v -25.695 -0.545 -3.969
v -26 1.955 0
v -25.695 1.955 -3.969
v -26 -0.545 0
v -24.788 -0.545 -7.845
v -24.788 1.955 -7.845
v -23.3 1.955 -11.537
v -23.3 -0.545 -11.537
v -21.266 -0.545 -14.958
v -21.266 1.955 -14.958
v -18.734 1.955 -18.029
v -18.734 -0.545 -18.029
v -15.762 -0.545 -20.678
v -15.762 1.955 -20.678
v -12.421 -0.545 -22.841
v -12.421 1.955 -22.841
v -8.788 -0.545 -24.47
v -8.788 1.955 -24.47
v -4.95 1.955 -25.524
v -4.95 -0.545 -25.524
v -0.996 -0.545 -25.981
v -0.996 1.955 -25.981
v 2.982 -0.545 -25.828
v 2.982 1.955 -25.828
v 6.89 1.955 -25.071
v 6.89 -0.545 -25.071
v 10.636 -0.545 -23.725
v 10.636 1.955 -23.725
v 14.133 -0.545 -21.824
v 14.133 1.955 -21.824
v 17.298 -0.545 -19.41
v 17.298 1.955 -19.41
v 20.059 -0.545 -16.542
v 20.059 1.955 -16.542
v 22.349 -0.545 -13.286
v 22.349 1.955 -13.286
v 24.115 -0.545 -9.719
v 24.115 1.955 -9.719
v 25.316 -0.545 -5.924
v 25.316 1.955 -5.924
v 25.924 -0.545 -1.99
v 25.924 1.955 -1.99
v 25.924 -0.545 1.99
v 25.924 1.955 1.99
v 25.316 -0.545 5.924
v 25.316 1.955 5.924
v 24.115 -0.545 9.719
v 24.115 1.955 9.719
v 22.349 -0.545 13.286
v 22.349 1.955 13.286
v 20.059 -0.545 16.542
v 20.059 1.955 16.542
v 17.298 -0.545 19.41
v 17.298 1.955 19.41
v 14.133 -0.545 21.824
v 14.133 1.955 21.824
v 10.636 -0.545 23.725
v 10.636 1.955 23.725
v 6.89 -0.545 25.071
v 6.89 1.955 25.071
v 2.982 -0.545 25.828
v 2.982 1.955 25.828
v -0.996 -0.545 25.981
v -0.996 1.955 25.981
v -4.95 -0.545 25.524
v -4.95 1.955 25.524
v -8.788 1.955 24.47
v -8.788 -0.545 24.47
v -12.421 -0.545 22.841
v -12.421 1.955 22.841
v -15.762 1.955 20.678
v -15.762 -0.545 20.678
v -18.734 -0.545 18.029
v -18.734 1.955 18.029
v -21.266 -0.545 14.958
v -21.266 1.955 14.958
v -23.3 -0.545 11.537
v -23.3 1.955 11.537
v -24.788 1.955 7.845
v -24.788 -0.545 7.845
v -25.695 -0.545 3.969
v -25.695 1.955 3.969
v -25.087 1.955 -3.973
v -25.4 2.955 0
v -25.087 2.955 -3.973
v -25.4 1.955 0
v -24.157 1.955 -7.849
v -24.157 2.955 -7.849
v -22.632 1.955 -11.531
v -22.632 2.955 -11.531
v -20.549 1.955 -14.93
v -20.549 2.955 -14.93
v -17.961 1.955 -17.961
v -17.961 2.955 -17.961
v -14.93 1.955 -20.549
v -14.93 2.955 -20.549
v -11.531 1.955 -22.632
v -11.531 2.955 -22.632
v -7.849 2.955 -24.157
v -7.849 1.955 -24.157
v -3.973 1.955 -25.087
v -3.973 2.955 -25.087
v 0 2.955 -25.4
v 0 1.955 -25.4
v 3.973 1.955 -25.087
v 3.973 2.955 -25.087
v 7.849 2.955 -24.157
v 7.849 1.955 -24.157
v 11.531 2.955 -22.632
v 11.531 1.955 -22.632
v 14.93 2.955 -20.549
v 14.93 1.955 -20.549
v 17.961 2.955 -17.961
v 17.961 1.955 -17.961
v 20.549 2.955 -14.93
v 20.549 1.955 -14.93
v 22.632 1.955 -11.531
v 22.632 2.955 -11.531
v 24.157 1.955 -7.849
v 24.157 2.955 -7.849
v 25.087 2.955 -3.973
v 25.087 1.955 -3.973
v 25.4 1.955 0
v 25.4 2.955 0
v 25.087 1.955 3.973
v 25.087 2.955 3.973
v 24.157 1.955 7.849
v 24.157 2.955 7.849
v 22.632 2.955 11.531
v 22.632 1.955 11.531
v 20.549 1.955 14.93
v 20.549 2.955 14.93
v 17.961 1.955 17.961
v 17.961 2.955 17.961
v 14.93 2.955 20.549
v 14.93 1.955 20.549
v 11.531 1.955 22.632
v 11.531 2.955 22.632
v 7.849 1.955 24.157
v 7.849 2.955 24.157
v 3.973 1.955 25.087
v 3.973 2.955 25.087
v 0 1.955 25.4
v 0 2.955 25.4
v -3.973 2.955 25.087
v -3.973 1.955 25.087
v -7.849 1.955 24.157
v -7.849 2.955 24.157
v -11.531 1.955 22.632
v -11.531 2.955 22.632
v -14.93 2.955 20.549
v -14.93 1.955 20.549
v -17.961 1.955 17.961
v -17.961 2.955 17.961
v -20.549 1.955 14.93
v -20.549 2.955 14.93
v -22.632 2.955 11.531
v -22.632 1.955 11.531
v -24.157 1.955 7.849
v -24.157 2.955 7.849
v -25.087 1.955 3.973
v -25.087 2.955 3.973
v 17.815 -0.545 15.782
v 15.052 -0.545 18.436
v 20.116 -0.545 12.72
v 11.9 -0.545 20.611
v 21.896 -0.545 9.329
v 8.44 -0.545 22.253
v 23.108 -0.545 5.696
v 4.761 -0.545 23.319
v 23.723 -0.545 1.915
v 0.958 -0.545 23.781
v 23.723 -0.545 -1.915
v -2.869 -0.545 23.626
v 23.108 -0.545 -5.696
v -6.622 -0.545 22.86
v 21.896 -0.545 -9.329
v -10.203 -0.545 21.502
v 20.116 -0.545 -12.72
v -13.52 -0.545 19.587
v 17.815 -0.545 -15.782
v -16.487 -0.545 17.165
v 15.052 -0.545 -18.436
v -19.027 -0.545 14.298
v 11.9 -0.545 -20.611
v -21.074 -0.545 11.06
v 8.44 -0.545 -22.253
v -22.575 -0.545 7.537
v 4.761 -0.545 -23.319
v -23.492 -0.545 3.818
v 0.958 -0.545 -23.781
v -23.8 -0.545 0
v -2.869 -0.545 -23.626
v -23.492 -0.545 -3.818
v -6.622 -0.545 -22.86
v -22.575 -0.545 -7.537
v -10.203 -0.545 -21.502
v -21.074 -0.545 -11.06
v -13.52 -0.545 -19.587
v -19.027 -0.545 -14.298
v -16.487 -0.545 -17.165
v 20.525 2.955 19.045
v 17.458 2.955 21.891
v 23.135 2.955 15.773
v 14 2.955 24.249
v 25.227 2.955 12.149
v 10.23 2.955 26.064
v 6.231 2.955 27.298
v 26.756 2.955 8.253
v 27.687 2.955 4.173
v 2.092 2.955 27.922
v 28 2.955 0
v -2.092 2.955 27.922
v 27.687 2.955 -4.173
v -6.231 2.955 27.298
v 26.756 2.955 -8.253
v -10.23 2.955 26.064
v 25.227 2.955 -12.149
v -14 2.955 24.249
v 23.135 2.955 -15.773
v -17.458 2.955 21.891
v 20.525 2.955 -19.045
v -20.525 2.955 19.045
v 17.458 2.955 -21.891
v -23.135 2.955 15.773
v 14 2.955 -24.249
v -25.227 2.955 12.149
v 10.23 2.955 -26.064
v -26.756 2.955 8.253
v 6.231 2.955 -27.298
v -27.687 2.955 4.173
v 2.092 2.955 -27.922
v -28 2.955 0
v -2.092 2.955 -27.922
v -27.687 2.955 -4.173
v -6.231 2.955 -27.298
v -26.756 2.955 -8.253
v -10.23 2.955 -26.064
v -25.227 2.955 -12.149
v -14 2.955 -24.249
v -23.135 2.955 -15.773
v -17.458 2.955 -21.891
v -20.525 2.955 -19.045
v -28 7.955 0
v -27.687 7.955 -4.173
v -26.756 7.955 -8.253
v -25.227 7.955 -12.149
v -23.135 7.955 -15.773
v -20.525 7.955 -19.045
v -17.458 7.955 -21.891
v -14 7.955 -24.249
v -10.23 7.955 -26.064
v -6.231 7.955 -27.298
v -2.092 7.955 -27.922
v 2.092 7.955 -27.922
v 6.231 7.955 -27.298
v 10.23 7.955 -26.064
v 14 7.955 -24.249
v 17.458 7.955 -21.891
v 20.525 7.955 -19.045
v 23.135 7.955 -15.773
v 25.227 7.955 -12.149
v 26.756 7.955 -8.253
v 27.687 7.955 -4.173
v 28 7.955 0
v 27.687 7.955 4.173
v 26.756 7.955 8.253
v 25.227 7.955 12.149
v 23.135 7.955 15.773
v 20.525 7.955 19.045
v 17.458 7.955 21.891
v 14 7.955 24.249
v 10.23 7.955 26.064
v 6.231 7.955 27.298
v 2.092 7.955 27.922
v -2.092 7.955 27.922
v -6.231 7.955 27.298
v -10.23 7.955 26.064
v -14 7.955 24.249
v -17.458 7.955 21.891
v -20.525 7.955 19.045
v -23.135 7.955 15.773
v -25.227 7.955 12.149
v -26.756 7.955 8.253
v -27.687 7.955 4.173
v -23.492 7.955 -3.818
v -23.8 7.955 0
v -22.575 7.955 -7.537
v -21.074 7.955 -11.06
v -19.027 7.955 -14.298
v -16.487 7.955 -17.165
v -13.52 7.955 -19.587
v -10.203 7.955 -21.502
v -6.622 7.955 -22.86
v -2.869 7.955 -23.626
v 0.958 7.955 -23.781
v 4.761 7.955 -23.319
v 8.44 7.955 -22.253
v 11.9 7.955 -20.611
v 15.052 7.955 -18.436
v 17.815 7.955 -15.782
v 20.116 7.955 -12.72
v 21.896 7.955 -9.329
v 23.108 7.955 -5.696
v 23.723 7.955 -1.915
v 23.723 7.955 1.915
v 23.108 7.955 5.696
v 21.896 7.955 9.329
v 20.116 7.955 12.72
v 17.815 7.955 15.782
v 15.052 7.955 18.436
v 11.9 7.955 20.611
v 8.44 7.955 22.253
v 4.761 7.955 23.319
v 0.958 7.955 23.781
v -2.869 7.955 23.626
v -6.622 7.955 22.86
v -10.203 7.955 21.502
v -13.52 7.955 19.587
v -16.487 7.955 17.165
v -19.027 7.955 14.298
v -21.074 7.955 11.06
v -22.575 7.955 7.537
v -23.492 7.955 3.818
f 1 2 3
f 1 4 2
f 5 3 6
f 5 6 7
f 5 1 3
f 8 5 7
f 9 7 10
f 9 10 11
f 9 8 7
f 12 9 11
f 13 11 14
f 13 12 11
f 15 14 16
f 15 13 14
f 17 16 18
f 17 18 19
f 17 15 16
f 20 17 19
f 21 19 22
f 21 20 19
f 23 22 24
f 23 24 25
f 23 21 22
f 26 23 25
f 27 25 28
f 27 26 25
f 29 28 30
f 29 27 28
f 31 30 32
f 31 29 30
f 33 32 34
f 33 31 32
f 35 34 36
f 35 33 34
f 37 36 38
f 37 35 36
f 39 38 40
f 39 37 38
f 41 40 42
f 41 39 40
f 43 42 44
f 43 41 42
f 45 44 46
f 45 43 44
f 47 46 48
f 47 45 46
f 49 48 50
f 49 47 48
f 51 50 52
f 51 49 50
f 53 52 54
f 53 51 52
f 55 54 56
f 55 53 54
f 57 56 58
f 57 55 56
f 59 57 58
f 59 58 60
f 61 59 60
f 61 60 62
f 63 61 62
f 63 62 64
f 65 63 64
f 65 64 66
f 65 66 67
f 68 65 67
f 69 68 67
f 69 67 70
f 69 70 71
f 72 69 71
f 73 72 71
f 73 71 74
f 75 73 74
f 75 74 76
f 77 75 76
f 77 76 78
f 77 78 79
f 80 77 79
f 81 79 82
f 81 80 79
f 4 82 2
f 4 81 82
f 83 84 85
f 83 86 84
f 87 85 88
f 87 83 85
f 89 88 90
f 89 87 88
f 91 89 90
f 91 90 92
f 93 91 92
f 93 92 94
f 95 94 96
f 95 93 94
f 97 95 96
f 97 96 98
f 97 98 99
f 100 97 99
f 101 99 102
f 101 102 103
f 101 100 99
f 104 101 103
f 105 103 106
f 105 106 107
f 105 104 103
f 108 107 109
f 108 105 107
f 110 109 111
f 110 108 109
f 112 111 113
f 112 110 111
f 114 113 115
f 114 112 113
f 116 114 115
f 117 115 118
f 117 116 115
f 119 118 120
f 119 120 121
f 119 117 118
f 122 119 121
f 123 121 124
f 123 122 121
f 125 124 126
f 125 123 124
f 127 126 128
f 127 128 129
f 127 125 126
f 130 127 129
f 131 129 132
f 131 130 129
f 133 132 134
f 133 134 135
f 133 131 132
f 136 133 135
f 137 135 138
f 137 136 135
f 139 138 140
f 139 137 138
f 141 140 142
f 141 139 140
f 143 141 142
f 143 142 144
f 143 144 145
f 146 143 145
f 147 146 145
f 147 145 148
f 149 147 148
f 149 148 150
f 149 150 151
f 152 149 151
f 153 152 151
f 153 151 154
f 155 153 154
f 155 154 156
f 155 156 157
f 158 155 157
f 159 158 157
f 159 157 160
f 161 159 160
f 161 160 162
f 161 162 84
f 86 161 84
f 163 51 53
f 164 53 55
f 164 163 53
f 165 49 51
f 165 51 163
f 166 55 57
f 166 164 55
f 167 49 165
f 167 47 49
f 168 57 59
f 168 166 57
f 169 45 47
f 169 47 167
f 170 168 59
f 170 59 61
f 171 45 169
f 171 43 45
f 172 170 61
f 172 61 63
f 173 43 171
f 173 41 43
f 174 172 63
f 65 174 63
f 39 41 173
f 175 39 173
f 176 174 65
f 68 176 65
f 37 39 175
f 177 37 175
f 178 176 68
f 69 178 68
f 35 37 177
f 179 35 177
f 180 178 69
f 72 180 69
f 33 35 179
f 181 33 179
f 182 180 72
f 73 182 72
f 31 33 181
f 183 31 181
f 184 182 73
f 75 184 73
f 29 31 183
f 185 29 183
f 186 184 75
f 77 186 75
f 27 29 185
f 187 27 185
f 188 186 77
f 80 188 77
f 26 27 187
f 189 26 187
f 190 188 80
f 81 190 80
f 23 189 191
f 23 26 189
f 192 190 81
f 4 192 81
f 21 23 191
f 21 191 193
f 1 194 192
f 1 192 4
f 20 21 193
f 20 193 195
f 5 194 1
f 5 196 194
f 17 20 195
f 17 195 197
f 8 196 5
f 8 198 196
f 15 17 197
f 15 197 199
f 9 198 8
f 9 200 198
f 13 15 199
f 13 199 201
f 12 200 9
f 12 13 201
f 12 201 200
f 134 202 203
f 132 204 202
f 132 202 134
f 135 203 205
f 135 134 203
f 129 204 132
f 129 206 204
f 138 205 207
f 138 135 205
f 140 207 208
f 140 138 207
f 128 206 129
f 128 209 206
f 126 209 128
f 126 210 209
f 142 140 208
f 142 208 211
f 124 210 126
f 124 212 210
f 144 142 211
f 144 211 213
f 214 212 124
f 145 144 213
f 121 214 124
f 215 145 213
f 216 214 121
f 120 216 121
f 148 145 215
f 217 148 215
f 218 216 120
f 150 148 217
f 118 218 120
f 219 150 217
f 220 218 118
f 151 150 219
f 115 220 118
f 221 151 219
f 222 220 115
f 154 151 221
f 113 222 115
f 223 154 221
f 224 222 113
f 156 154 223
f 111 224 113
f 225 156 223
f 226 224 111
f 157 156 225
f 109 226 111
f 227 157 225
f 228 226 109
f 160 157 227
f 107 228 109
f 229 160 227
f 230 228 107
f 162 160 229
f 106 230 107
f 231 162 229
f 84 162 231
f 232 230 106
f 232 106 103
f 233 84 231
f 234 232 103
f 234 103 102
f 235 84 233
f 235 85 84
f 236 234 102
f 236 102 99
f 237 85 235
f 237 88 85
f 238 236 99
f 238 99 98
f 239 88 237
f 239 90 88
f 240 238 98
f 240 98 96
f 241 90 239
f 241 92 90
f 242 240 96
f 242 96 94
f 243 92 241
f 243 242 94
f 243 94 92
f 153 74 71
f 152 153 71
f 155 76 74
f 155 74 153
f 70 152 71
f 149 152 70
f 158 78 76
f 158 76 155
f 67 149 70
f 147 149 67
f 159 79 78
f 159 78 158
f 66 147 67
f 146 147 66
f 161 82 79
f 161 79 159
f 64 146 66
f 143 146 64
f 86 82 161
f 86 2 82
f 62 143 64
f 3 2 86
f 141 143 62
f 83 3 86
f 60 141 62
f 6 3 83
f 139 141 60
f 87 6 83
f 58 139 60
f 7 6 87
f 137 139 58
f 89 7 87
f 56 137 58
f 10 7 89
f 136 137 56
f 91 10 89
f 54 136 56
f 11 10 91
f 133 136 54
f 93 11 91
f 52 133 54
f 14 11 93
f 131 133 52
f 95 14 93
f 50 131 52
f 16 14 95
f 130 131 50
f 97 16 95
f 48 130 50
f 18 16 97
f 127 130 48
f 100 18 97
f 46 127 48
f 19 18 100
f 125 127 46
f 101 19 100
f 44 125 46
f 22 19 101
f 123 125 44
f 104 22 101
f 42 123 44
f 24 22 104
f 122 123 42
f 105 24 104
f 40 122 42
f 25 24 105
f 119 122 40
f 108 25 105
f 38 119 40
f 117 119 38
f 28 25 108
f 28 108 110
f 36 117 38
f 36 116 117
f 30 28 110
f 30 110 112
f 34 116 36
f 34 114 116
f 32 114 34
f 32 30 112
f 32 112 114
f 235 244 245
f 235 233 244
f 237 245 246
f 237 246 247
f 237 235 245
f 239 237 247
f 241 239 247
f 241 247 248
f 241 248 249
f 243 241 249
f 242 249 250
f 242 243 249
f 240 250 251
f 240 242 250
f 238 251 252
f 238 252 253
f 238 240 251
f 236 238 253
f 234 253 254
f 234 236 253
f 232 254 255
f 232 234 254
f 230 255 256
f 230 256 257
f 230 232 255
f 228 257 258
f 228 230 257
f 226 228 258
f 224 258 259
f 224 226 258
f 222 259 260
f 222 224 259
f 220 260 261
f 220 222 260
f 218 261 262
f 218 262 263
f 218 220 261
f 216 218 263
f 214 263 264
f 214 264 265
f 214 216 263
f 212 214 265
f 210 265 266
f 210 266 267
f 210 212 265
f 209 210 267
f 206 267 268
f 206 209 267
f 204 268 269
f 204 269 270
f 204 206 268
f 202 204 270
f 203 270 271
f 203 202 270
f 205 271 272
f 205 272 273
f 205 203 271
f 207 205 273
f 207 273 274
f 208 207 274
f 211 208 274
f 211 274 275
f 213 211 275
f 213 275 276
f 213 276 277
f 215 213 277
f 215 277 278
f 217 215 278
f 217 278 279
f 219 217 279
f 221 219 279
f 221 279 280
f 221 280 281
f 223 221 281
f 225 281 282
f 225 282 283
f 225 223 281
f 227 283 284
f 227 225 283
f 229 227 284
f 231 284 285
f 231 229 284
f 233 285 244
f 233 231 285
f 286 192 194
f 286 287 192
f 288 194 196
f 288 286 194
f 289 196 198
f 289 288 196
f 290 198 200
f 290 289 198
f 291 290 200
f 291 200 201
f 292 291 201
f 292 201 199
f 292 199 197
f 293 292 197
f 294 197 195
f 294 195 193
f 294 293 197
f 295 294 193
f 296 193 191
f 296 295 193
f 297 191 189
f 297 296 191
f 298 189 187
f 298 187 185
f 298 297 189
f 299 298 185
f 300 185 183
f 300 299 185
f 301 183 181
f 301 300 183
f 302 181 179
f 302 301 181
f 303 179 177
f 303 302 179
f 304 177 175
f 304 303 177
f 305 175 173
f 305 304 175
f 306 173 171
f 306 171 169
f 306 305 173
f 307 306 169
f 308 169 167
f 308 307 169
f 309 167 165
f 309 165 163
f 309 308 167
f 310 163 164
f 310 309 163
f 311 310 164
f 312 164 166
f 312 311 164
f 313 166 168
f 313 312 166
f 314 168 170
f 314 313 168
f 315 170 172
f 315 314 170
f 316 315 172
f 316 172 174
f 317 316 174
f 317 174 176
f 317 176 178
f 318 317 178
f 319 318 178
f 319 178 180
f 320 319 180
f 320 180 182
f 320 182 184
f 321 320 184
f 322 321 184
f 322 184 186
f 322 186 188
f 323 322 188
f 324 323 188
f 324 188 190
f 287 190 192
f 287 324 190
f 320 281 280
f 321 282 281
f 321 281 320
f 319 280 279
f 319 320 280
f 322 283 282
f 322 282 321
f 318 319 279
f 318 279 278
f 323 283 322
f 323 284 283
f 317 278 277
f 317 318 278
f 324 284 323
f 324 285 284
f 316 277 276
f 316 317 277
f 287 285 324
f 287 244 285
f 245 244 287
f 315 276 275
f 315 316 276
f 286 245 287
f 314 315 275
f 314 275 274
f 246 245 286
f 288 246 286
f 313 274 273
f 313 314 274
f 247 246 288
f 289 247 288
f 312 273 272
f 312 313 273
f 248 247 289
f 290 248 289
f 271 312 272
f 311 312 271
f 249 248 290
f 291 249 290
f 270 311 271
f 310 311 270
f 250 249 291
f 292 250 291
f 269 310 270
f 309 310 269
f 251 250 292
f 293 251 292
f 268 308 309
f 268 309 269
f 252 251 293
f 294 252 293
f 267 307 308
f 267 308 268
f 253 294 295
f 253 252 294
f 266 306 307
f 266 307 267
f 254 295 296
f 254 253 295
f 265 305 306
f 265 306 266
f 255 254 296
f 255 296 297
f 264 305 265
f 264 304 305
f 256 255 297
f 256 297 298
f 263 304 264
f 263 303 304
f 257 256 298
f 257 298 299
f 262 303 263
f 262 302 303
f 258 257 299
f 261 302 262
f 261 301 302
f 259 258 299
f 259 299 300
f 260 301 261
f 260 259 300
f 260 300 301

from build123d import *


with BuildPart() as part:
    # 草图1 → 旋转1 (revolve)
    with BuildSketch(Plane.XY, mode=Mode.PRIVATE) as revolve_1_sk:
        Polygon((23.8, -0.545464411), (23.8, 7.954535589), (28, 7.954535589), (28, 2.954535589), (25.4, 2.954535589), (25.4, 1.954535589), (26, 1.954535589), (26, -0.545464411), align=None)
    revolve(revolve_1_sk.sketch.rotate(Axis((0, 16.886018237, 0), (0, -1, 0)), 180), axis=Axis((0, 16.886018237, 0), (0, -1, 0)))  # turned: the seam where the file's is


solid = part.part
